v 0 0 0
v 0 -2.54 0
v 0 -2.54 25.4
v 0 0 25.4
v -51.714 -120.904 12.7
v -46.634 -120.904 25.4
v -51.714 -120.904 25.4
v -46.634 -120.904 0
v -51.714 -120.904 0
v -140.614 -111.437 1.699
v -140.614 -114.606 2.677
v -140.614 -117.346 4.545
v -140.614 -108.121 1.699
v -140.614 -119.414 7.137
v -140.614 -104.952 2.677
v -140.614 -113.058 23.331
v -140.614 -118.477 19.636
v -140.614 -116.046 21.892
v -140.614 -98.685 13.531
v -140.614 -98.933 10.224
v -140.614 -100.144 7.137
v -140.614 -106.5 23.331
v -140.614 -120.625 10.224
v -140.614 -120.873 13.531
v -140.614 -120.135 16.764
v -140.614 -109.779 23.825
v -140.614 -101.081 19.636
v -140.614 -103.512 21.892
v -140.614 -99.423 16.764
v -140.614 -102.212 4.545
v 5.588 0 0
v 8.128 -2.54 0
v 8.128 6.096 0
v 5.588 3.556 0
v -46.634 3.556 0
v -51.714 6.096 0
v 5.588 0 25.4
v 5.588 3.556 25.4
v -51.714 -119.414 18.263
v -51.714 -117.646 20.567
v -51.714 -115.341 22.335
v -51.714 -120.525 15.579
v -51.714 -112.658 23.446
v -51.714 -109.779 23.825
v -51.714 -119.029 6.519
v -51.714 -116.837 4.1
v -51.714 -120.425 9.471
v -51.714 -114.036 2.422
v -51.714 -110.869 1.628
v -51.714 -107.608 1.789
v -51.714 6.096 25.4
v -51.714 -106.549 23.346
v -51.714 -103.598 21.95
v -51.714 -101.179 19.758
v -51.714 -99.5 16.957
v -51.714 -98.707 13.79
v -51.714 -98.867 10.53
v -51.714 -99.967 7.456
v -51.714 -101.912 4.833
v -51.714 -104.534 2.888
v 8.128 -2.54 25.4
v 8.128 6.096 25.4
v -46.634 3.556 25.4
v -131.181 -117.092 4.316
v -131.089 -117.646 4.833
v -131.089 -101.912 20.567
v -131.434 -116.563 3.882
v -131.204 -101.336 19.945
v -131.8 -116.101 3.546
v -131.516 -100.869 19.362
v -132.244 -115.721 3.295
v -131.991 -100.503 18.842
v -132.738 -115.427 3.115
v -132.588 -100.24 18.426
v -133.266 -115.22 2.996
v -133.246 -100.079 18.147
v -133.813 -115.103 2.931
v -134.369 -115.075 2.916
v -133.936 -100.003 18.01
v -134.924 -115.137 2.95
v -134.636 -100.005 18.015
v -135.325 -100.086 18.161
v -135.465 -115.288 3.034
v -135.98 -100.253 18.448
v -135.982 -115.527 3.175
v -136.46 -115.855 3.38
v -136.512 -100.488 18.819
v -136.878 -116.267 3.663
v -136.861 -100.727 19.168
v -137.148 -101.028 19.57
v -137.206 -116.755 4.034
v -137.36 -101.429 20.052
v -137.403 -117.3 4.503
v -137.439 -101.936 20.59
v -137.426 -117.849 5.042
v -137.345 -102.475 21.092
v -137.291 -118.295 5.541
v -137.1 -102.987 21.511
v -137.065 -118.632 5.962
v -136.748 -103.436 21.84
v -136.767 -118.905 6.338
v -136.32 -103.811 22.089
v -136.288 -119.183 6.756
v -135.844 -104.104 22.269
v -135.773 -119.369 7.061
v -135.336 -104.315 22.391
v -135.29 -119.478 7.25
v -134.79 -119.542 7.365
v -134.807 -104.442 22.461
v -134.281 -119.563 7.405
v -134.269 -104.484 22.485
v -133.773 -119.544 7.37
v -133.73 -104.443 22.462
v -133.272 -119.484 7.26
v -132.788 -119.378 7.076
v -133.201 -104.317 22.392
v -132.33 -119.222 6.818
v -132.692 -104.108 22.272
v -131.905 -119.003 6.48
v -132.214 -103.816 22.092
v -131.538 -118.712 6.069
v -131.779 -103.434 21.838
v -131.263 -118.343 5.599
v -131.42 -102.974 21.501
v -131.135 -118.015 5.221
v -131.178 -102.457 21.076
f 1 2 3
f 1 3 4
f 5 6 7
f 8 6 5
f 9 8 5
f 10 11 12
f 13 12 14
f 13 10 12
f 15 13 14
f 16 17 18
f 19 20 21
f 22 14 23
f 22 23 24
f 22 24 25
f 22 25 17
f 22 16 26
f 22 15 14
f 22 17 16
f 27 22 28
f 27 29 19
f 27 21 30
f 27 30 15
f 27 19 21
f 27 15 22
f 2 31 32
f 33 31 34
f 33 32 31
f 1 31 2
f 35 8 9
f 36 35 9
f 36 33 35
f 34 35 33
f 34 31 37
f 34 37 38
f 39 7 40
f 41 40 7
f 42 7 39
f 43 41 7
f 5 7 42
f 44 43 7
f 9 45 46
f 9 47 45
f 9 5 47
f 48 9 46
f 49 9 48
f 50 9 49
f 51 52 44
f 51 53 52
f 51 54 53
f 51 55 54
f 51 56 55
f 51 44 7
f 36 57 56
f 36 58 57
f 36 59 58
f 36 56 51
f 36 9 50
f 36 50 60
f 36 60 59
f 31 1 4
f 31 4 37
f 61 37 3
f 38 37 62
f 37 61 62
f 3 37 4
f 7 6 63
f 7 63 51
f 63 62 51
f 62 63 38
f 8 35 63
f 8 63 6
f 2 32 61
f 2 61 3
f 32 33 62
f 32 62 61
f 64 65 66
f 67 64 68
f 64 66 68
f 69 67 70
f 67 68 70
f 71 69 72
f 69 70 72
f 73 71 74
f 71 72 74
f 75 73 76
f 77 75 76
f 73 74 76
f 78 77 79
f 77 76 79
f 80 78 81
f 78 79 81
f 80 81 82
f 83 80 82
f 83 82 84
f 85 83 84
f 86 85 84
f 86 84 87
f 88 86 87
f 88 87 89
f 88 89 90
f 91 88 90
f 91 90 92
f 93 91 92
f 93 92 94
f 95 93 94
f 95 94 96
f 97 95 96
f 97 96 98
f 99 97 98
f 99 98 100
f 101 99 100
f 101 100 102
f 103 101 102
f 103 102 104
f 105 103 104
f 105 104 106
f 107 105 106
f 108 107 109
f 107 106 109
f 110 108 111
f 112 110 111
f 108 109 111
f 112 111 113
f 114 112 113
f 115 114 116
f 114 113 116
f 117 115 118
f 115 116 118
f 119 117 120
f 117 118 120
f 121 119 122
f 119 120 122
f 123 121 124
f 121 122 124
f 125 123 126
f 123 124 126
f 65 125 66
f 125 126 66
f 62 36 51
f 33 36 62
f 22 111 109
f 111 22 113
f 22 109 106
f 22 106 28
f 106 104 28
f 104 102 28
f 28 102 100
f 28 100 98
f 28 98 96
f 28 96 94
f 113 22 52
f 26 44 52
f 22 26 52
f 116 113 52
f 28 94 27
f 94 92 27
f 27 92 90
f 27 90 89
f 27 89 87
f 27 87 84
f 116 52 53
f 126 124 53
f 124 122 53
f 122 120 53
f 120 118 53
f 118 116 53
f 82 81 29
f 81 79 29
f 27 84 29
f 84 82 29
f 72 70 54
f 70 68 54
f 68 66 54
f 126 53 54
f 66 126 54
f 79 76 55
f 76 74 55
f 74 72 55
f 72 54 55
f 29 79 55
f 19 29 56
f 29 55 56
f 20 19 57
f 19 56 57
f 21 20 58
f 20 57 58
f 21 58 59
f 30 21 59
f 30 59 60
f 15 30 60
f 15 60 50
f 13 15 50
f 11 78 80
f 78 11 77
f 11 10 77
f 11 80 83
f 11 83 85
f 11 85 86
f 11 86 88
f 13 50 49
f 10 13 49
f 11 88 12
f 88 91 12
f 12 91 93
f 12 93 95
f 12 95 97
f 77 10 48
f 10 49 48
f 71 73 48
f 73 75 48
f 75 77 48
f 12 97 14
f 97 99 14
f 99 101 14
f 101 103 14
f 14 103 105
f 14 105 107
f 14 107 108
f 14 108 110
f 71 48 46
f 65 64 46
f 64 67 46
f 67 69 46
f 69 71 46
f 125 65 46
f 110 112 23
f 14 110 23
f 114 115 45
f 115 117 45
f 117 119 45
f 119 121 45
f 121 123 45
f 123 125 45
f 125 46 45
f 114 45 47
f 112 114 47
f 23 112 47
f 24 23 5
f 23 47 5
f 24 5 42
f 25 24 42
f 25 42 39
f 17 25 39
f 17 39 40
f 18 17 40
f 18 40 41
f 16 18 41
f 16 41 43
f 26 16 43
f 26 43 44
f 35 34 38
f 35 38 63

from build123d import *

# Parameters (mm, degrees)
BOSS_EXTRUDE1_DEPTH = 25.4
SKETCH2_R           = 11.1252
BOSS_EXTRUDE2_DEPTH = 88.9
SKETCH3_R           = 3.175
CUT_EXTRUDE1_DEPTH  = 28.972160483


with BuildPart() as part:
    # Sketch1 → Boss-Extrude1 (new body)
    with BuildSketch(Plane.XY):
        Polygon((0, 0), (5.588, 0), (5.588, 3.556), (-46.6344, 3.556), (-46.6344, -120.904), (-51.7144, -120.904), (-51.7144, 6.096), (8.128, 6.096), (8.128, -2.54), (0, -2.54), align=None)
    extrude(amount=BOSS_EXTRUDE1_DEPTH)

    # Sketch2 → Boss-Extrude2 (add)
    with BuildSketch(Plane.ZY.offset(51.7144)):
        with Locations((12.7, -109.7788)):
            Circle(SKETCH2_R)
    extrude(amount=BOSS_EXTRUDE2_DEPTH)

    # Sketch3 → Cut-Extrude1 (cut, through all)
    with BuildSketch(Plane(origin=(0, -40.672695638, -40.672695638), x_dir=(1, 0, 0), z_dir=(0, 0.707106781, 0.707106781))):
        with Locations((-134.2644, -86.605590032)):
            Circle(SKETCH3_R)
    extrude(amount=-CUT_EXTRUDE1_DEPTH, mode=Mode.SUBTRACT)


solid = part.part
